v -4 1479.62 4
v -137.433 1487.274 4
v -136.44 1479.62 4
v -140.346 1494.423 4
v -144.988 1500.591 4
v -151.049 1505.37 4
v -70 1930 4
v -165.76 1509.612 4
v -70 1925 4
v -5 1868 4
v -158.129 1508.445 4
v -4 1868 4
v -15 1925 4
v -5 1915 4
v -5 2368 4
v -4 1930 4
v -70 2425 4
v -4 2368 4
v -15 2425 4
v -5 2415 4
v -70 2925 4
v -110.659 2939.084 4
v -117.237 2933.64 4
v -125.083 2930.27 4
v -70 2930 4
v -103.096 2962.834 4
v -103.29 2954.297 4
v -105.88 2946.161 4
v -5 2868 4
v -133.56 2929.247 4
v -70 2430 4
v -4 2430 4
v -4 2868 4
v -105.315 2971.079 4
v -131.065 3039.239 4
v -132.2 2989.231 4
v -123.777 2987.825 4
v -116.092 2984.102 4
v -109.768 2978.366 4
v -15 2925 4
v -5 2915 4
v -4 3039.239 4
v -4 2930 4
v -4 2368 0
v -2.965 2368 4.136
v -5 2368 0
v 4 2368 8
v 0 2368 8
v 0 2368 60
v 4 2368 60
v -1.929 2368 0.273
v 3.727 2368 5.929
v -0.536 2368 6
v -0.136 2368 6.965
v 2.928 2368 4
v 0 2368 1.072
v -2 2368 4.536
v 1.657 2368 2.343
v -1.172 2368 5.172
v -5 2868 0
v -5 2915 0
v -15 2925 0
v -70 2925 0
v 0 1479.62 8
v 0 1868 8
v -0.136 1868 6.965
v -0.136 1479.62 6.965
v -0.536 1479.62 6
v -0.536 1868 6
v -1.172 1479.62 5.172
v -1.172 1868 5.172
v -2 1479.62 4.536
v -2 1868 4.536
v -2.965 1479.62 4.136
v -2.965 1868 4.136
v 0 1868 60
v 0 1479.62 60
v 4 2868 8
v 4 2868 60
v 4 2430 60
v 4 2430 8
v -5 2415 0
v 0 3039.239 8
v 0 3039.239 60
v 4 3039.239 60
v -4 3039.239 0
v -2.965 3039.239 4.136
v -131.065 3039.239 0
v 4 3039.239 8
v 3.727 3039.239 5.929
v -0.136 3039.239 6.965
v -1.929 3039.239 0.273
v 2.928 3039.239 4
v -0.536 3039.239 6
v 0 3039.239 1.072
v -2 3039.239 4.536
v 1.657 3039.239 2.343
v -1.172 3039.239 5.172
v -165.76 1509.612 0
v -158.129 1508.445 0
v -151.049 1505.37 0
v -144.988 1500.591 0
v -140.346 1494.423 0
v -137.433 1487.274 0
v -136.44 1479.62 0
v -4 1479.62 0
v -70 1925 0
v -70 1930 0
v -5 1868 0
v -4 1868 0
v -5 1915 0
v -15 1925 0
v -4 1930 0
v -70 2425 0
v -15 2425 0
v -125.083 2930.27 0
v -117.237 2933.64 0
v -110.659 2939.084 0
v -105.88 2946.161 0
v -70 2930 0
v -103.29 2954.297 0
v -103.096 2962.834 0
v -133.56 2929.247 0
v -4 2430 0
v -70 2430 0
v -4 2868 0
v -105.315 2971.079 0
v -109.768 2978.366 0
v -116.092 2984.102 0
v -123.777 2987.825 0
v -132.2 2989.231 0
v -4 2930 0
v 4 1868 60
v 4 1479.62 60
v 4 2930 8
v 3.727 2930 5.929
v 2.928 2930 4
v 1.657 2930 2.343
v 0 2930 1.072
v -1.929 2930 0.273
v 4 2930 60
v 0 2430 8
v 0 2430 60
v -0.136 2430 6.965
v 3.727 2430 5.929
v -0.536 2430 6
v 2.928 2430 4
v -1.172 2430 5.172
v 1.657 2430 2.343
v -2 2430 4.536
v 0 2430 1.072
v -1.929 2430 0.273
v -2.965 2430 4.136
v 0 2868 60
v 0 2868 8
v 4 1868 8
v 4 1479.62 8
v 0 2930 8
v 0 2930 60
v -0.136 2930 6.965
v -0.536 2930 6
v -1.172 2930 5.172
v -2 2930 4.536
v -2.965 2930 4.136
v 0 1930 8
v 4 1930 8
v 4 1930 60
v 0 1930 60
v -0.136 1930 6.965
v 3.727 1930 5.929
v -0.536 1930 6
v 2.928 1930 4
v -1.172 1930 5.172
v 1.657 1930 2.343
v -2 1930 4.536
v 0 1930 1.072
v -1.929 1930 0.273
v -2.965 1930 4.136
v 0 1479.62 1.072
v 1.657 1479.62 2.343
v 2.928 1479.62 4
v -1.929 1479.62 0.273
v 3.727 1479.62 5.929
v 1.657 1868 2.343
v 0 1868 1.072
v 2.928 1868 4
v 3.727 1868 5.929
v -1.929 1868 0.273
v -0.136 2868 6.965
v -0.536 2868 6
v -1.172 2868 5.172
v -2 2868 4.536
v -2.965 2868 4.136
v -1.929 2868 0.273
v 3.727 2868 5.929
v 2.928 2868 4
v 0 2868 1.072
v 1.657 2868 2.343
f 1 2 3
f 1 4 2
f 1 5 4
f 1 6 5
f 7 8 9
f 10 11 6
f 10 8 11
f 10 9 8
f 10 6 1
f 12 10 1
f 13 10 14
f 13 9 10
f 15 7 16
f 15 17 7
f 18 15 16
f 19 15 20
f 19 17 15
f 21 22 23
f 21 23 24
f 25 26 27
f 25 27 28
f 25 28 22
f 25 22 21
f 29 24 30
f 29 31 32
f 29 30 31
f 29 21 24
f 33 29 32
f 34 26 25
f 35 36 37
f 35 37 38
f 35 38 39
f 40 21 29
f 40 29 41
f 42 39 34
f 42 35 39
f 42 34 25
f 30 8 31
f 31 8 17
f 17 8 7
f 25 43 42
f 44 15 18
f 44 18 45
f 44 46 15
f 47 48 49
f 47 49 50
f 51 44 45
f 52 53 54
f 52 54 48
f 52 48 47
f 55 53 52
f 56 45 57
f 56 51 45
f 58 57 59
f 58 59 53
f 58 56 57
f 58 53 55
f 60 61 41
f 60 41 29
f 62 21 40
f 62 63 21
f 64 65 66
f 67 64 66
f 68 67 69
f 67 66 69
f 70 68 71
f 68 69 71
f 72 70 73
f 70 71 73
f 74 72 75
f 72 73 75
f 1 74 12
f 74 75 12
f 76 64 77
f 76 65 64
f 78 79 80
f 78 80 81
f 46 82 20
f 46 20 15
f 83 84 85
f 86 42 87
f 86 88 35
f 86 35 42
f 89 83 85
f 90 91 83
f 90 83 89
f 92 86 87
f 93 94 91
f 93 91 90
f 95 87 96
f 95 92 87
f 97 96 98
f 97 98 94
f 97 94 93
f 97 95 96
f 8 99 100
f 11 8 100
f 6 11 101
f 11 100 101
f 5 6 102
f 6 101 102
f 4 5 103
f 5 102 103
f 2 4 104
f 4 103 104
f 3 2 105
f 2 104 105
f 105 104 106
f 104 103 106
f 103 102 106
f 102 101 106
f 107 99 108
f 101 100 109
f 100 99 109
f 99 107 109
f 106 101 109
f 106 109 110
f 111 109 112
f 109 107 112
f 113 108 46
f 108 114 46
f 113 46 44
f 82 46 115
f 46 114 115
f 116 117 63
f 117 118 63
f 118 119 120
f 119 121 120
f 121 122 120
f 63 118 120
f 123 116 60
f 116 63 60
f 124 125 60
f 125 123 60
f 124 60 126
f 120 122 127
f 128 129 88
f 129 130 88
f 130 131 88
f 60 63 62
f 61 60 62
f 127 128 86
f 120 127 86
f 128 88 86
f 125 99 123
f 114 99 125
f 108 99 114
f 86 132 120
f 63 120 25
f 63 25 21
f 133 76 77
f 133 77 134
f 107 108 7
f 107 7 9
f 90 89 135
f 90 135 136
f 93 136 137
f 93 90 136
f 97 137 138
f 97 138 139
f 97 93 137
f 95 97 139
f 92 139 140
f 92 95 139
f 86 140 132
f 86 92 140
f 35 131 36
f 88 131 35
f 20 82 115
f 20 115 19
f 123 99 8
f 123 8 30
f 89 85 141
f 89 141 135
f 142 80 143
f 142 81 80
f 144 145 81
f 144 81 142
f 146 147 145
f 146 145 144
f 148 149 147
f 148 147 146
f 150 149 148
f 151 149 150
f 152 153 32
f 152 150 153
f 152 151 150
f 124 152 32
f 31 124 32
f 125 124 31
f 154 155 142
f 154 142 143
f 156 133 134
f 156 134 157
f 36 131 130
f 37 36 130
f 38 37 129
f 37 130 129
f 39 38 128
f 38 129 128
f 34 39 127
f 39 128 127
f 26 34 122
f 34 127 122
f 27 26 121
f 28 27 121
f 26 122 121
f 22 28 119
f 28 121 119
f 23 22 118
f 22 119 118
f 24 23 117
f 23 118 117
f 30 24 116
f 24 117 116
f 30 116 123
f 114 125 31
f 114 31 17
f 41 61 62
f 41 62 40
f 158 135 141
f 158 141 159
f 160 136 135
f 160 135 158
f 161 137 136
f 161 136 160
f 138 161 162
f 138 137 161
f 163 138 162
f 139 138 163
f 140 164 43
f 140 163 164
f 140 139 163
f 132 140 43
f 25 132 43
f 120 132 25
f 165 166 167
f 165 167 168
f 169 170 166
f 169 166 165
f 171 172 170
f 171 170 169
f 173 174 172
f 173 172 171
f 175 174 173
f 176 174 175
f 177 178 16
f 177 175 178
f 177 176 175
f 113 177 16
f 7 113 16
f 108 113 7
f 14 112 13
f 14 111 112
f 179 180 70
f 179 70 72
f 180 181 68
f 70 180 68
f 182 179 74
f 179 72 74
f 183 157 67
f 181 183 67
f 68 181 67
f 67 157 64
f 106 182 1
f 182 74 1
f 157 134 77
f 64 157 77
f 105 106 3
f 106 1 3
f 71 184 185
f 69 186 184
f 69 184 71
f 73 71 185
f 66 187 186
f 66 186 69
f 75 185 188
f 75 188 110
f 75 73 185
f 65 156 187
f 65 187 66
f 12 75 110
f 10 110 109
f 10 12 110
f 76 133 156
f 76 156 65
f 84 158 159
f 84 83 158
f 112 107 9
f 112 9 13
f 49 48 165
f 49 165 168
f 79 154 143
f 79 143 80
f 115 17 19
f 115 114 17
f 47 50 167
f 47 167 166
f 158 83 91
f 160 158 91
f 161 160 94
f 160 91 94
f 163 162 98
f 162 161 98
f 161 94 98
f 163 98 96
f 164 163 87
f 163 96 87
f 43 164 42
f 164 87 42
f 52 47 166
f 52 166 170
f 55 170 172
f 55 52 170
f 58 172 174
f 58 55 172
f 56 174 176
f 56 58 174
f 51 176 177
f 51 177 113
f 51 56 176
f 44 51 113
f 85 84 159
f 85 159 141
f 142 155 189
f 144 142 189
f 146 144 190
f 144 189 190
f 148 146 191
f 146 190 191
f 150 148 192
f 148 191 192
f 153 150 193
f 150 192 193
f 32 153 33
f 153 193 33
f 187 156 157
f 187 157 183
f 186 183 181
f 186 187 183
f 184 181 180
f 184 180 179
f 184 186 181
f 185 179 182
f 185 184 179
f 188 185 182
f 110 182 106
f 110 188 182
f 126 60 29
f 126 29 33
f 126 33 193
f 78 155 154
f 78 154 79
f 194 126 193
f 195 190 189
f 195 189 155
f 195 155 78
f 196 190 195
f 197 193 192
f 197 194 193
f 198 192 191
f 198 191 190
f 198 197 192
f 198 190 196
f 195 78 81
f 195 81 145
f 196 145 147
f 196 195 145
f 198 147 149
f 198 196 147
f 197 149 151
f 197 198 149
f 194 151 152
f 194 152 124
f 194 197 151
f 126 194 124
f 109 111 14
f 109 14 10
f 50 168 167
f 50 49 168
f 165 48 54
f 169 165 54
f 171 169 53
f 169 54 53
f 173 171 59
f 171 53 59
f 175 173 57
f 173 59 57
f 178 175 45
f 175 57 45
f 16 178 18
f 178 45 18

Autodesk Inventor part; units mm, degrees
ref_plane "YZ Plane" through (0, 0, 0) normal (1, 0, 0) x (0, 1, 0)
ref_plane "XZ Plane" through (0, 0, 0) normal (0, 1, 0) x (-1, 0, 0)
ref_plane "XY Plane" through (0, 0, 0) normal (0, 0, 1) x (1, 0, 0)
sketch "Sketch1" plane through (0, 0, 0) normal (0, 0, 1) x (1, 0, 0)
  line L0 (0, 0) -> (0, 1479.6195)
  line L1 (0, 1479.6195) -> (-166.4399, 1479.6195)
  line L2 (-166.4399, 1479.6195) -> (-200, 0)
  line L3 (-200, 0) -> (0, 0)
  line L4 (0, 430) -> (-5, 430)
  line L5 (-5, 430) -> (-5, 368)
  line L6 (-5, 368) -> (0, 368)
  line L7 (0, 368) -> (0, 430)
  line L8 (-5, 430) -> (-70, 430)
  line L9 (-70, 430) -> (-70, 425)
  line L10 (-70, 425) -> (-5, 425)
  line L11 (-5, 425) -> (-5, 430)
  line L12 (-70, 430) -> (-190.2469, 430) construction
  line L13 (0, 4408.8661) -> (0, 1479.6195)
  line L14 (-166.4399, 1479.6195) -> (-132.8798, 2959.2389)
  line L15 (0, 4408.8661) -> (-100, 4408.8661)
  line L16 (-132.8798, 2959.2389) -> (0, 2959.2389)
  line L17 (-132.8798, 2959.2389) -> (-100, 4408.8661)
  line L18 (-5, 868) -> (0, 868)
  line L19 (-70, 925) -> (-5, 925)
  line L20 (-5, 930) -> (-70, 930)
  line L21 (-70, 930) -> (-70, 925)
  line L22 (-5, 925) -> (-5, 930)
  line L23 (-5, 930) -> (-5, 868)
  line L24 (0, 868) -> (0, 930)
  line L25 (0, 930) -> (-5, 930)
  line L26 (-5, 1368) -> (0, 1368)
  line L27 (-70, 1425) -> (-5, 1425)
  line L28 (-5, 1430) -> (-70, 1430)
  line L29 (-70, 1430) -> (-70, 1425)
  line L30 (-5, 1425) -> (-5, 1430)
  line L31 (-5, 1430) -> (-5, 1368)
  line L32 (0, 1368) -> (0, 1430)
  line L33 (0, 1430) -> (-5, 1430)
  line L34 (-5, 1868) -> (0, 1868)
  line L35 (-70, 1925) -> (-5, 1925)
  line L36 (-5, 1930) -> (-70, 1930)
  line L37 (-70, 1930) -> (-70, 1925)
  line L38 (-5, 1925) -> (-5, 1930)
  line L39 (-5, 1930) -> (-5, 1868)
  line L40 (0, 1868) -> (0, 1930)
  line L41 (0, 1930) -> (-5, 1930)
  line L42 (-5, 2368) -> (0, 2368)
  line L43 (-70, 2425) -> (-5, 2425)
  line L44 (-5, 2430) -> (-70, 2430)
  line L45 (-70, 2430) -> (-70, 2425)
  line L46 (-5, 2425) -> (-5, 2430)
  line L47 (-5, 2430) -> (-5, 2368)
  line L48 (0, 2368) -> (0, 2430)
  line L49 (0, 2430) -> (-5, 2430)
  line L50 (-5, 2868) -> (0, 2868)
  line L51 (-70, 2925) -> (-5, 2925)
  line L52 (-5, 2930) -> (-70, 2930)
  line L53 (-70, 2930) -> (-70, 2925)
  line L54 (-5, 2925) -> (-5, 2930)
  line L55 (-5, 2930) -> (-5, 2868)
  line L56 (0, 2868) -> (0, 2930)
  line L57 (0, 2930) -> (-5, 2930)
  line L58 (-100, 4408.8661) -> (-99.3197, 4438.8584) construction
  line L59 (0, 1629.6195) -> (-163.0377, 1629.6195)
  line L60 (-131.0653, 3039.2389) -> (0, 3039.2389)
  line L61 (-5, 3368) -> (0, 3368)
  line L62 (-70, 3425) -> (-5, 3425)
  line L63 (-5, 3430) -> (-70, 3430)
  line L64 (-70, 3430) -> (-70, 3425)
  line L65 (-5, 3425) -> (-5, 3430)
  line L66 (-5, 3430) -> (-5, 3368)
  line L67 (0, 3368) -> (0, 3430)
  line L68 (0, 3430) -> (-5, 3430)
  line L69 (-5, 3868) -> (0, 3868)
  line L70 (-70, 3925) -> (-5, 3925)
  line L71 (-5, 3930) -> (-70, 3930)
  line L72 (-70, 3930) -> (-70, 3925)
  line L73 (-5, 3925) -> (-5, 3930)
  line L74 (-5, 3930) -> (-5, 3868)
  line L75 (0, 3868) -> (0, 3930)
  line L76 (0, 3930) -> (-5, 3930)
  arc A0 (-140, 0) -> (-198.6395, 59.9846) centre (-200, 0) ccw
  arc A1 (-167.1202, 1449.6272) -> (-165.7596, 1509.6117) centre (-166.4399, 1479.6195) ccw
  arc A2 (-133.5601, 2929.2466) -> (-132.1995, 2989.2312) centre (-132.8798, 2959.2389) ccw
  line L77 (0, 930) -> (-70, 930)
  line L78 (-70, 930) -> (-178.9061, 930) construction
  line L79 (-70, 1430) -> (-167.5654, 1430) construction
  line L80 (-70, 1930) -> (-156.2246, 1930) construction
  line L81 (-70, 2430) -> (-144.8838, 2430) construction
  line L82 (-70, 2930) -> (-133.543, 2930) construction
  line L83 (-70, 3430) -> (-122.2022, 3430) construction
  line L84 (-70, 3930) -> (-110.8614, 3930) construction
  point P0 (0, 430)
  point P1 (-136.4399, 1479.6195)
  dimension "d25" = 430
  dimension "d32" = 1480
  dimension "d33" = 1480
  dimension "d34" = 1450
  dimension "d35" = 100
  dimension "d38" = 500
  dimension "d44" = 30
  dimension "d45" = 150
  dimension "d46" = 80
  dimension "d47" = 200
  dimension "d48" = 5
  dimension "d50" = 62
  dimension "d51" = 60
  dimension "d52" = 30
  dimension "d53" = 478.8661
  dimension "d54" = 30
  dimension "d56" = 190.2469
  dimension "d57" = 178.9061
  dimension "d58" = 167.5654
  dimension "d59" = 156.2246
  dimension "d60" = 144.8838
  dimension "d61" = 133.543
  dimension "d62" = 122.2022
  dimension "d63" = 110.8614
  dimension "d64" = 70
extrude "Plate1" add sketch "Sketch1" along normal blind 4 contours A1 L14 L59 L13 L1 | L14 A2 L16 L13 L57 L52 L53 L51 L55 L50 L49 L44 L45 L43 L47 L42 L41 L36 L37 L35 L39 L34 L59 | A2 L17 L60 L13 L16
sketch "Sketch2" plane through (4, 1479.6195, 0) normal (-1, 0, 0) x (0, -1, 0)
  line L0 (-388.3805, 0) -> (0, 0)
  line L1 (0, 0) -> (0, -60)
  line L2 (0, -60) -> (-388.3805, -60)
  line L3 (-388.3805, -60) -> (-388.3805, 0)
edge flange "Flange1" height 60 angle 90 thickness 4 bend radius 4 thickness toward (-1, 0, 0) relief tear relief width 4 relief depth 2 corner gap 4 corner form 0 edges at (0, 1673.8097, 0) (0, 2149, 0) (0, 2649, 0) (0, 2984.6195, 0) wall of the first edge with corners at (4, 1868, 0) (4, 1479.6195, 0) (4, 1479.6195, 60) (4, 1868, 60)
bend "Bend1"
corner "Corner1"
chamfer "Corner Chamfer1" distance 10 angle 45 3 edges at (-5, 1925, 2) (-5, 2425, 2) (-5, 2925, 2)
equation "\"d5\" = Thickness"
equation "\"d7\" = BendReliefWidth"
equation "\"d8\" = BendReliefDepth"
equation "\"d9\" = MinimumRemnant"
equation "\"d10\" = TransitionRadius"
equation "\"d13\" = BendRadius"
equation "\"d14\" = CornerReliefSize"
equation "\"d15\" = GapSize"
equation "\"d16\" = JacobiRadiusSize"
equation "\"BendRadius\" = Thickness"
equation "\"BendReliefWidth\" = Thickness"
equation "\"BendReliefDepth\" = 0.5 * Thickness"
equation "\"CornerReliefSize\" = 4 * Thickness"
equation "\"MinimumRemnant\" = 2 * Thickness"
equation "\"TransitionRadius\" = BendRadius"
equation "\"JacobiRadiusSize\" = BendRadius"
equation "\"GapSize\" = Thickness"
equation "\"Thickness\" = 4"
properties part number "GBK 0201 second rib" material "Steel"
